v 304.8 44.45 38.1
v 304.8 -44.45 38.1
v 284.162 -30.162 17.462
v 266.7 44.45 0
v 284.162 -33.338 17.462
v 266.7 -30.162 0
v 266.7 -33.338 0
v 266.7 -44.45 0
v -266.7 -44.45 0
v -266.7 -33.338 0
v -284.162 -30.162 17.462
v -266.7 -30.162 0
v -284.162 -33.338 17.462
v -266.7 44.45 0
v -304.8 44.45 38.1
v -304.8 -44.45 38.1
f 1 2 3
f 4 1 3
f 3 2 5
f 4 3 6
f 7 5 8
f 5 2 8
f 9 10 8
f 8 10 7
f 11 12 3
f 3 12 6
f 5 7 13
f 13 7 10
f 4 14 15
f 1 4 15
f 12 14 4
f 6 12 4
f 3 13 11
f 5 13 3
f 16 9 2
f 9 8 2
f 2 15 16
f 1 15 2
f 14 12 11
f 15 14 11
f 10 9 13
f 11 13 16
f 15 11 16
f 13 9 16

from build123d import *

# Parameters (mm, degrees)
F0_W     = 609.6
F0_H     = 88.9
F2_DEPTH = 38.1
F4_DEPTH = 88.901
F5_W     = 38.1
F5_H     = 3.175
F5_W_2   = 533.4
F1_DEPTH = 17.4625


with BuildPart() as f2:
    # F0 (on Top) → F2 (new body)
    with BuildSketch(Plane.XY):
        Rectangle(F0_W, F0_H)
    extrude(amount=F2_DEPTH)

    # F3 (on face) → F4 (cut, through all)
    with BuildSketch(Plane.XZ.offset(44.45)):
        Polygon((-266.7, 0), (-304.8, 38.1), (-304.8, 0), align=None)
        Polygon((304.8, 0), (304.8, 38.1), (266.7, 0), align=None)
    extrude(amount=-F4_DEPTH, mode=Mode.SUBTRACT)

    # F5 (on face) → F1 (cut)
    with BuildSketch(Plane(origin=(0, 0, 0), x_dir=(1, 0, 0), z_dir=(0, 0, -1))):
        with Locations((285.75, 31.75)):
            Rectangle(F5_W, F5_H)
        with Locations((0, 31.75)):
            Rectangle(F5_W_2, F5_H)
        with Locations((-285.75, 31.75)):
            Rectangle(F5_W, F5_H)
    extrude(amount=-F1_DEPTH, mode=Mode.SUBTRACT)


solid = f2.part
